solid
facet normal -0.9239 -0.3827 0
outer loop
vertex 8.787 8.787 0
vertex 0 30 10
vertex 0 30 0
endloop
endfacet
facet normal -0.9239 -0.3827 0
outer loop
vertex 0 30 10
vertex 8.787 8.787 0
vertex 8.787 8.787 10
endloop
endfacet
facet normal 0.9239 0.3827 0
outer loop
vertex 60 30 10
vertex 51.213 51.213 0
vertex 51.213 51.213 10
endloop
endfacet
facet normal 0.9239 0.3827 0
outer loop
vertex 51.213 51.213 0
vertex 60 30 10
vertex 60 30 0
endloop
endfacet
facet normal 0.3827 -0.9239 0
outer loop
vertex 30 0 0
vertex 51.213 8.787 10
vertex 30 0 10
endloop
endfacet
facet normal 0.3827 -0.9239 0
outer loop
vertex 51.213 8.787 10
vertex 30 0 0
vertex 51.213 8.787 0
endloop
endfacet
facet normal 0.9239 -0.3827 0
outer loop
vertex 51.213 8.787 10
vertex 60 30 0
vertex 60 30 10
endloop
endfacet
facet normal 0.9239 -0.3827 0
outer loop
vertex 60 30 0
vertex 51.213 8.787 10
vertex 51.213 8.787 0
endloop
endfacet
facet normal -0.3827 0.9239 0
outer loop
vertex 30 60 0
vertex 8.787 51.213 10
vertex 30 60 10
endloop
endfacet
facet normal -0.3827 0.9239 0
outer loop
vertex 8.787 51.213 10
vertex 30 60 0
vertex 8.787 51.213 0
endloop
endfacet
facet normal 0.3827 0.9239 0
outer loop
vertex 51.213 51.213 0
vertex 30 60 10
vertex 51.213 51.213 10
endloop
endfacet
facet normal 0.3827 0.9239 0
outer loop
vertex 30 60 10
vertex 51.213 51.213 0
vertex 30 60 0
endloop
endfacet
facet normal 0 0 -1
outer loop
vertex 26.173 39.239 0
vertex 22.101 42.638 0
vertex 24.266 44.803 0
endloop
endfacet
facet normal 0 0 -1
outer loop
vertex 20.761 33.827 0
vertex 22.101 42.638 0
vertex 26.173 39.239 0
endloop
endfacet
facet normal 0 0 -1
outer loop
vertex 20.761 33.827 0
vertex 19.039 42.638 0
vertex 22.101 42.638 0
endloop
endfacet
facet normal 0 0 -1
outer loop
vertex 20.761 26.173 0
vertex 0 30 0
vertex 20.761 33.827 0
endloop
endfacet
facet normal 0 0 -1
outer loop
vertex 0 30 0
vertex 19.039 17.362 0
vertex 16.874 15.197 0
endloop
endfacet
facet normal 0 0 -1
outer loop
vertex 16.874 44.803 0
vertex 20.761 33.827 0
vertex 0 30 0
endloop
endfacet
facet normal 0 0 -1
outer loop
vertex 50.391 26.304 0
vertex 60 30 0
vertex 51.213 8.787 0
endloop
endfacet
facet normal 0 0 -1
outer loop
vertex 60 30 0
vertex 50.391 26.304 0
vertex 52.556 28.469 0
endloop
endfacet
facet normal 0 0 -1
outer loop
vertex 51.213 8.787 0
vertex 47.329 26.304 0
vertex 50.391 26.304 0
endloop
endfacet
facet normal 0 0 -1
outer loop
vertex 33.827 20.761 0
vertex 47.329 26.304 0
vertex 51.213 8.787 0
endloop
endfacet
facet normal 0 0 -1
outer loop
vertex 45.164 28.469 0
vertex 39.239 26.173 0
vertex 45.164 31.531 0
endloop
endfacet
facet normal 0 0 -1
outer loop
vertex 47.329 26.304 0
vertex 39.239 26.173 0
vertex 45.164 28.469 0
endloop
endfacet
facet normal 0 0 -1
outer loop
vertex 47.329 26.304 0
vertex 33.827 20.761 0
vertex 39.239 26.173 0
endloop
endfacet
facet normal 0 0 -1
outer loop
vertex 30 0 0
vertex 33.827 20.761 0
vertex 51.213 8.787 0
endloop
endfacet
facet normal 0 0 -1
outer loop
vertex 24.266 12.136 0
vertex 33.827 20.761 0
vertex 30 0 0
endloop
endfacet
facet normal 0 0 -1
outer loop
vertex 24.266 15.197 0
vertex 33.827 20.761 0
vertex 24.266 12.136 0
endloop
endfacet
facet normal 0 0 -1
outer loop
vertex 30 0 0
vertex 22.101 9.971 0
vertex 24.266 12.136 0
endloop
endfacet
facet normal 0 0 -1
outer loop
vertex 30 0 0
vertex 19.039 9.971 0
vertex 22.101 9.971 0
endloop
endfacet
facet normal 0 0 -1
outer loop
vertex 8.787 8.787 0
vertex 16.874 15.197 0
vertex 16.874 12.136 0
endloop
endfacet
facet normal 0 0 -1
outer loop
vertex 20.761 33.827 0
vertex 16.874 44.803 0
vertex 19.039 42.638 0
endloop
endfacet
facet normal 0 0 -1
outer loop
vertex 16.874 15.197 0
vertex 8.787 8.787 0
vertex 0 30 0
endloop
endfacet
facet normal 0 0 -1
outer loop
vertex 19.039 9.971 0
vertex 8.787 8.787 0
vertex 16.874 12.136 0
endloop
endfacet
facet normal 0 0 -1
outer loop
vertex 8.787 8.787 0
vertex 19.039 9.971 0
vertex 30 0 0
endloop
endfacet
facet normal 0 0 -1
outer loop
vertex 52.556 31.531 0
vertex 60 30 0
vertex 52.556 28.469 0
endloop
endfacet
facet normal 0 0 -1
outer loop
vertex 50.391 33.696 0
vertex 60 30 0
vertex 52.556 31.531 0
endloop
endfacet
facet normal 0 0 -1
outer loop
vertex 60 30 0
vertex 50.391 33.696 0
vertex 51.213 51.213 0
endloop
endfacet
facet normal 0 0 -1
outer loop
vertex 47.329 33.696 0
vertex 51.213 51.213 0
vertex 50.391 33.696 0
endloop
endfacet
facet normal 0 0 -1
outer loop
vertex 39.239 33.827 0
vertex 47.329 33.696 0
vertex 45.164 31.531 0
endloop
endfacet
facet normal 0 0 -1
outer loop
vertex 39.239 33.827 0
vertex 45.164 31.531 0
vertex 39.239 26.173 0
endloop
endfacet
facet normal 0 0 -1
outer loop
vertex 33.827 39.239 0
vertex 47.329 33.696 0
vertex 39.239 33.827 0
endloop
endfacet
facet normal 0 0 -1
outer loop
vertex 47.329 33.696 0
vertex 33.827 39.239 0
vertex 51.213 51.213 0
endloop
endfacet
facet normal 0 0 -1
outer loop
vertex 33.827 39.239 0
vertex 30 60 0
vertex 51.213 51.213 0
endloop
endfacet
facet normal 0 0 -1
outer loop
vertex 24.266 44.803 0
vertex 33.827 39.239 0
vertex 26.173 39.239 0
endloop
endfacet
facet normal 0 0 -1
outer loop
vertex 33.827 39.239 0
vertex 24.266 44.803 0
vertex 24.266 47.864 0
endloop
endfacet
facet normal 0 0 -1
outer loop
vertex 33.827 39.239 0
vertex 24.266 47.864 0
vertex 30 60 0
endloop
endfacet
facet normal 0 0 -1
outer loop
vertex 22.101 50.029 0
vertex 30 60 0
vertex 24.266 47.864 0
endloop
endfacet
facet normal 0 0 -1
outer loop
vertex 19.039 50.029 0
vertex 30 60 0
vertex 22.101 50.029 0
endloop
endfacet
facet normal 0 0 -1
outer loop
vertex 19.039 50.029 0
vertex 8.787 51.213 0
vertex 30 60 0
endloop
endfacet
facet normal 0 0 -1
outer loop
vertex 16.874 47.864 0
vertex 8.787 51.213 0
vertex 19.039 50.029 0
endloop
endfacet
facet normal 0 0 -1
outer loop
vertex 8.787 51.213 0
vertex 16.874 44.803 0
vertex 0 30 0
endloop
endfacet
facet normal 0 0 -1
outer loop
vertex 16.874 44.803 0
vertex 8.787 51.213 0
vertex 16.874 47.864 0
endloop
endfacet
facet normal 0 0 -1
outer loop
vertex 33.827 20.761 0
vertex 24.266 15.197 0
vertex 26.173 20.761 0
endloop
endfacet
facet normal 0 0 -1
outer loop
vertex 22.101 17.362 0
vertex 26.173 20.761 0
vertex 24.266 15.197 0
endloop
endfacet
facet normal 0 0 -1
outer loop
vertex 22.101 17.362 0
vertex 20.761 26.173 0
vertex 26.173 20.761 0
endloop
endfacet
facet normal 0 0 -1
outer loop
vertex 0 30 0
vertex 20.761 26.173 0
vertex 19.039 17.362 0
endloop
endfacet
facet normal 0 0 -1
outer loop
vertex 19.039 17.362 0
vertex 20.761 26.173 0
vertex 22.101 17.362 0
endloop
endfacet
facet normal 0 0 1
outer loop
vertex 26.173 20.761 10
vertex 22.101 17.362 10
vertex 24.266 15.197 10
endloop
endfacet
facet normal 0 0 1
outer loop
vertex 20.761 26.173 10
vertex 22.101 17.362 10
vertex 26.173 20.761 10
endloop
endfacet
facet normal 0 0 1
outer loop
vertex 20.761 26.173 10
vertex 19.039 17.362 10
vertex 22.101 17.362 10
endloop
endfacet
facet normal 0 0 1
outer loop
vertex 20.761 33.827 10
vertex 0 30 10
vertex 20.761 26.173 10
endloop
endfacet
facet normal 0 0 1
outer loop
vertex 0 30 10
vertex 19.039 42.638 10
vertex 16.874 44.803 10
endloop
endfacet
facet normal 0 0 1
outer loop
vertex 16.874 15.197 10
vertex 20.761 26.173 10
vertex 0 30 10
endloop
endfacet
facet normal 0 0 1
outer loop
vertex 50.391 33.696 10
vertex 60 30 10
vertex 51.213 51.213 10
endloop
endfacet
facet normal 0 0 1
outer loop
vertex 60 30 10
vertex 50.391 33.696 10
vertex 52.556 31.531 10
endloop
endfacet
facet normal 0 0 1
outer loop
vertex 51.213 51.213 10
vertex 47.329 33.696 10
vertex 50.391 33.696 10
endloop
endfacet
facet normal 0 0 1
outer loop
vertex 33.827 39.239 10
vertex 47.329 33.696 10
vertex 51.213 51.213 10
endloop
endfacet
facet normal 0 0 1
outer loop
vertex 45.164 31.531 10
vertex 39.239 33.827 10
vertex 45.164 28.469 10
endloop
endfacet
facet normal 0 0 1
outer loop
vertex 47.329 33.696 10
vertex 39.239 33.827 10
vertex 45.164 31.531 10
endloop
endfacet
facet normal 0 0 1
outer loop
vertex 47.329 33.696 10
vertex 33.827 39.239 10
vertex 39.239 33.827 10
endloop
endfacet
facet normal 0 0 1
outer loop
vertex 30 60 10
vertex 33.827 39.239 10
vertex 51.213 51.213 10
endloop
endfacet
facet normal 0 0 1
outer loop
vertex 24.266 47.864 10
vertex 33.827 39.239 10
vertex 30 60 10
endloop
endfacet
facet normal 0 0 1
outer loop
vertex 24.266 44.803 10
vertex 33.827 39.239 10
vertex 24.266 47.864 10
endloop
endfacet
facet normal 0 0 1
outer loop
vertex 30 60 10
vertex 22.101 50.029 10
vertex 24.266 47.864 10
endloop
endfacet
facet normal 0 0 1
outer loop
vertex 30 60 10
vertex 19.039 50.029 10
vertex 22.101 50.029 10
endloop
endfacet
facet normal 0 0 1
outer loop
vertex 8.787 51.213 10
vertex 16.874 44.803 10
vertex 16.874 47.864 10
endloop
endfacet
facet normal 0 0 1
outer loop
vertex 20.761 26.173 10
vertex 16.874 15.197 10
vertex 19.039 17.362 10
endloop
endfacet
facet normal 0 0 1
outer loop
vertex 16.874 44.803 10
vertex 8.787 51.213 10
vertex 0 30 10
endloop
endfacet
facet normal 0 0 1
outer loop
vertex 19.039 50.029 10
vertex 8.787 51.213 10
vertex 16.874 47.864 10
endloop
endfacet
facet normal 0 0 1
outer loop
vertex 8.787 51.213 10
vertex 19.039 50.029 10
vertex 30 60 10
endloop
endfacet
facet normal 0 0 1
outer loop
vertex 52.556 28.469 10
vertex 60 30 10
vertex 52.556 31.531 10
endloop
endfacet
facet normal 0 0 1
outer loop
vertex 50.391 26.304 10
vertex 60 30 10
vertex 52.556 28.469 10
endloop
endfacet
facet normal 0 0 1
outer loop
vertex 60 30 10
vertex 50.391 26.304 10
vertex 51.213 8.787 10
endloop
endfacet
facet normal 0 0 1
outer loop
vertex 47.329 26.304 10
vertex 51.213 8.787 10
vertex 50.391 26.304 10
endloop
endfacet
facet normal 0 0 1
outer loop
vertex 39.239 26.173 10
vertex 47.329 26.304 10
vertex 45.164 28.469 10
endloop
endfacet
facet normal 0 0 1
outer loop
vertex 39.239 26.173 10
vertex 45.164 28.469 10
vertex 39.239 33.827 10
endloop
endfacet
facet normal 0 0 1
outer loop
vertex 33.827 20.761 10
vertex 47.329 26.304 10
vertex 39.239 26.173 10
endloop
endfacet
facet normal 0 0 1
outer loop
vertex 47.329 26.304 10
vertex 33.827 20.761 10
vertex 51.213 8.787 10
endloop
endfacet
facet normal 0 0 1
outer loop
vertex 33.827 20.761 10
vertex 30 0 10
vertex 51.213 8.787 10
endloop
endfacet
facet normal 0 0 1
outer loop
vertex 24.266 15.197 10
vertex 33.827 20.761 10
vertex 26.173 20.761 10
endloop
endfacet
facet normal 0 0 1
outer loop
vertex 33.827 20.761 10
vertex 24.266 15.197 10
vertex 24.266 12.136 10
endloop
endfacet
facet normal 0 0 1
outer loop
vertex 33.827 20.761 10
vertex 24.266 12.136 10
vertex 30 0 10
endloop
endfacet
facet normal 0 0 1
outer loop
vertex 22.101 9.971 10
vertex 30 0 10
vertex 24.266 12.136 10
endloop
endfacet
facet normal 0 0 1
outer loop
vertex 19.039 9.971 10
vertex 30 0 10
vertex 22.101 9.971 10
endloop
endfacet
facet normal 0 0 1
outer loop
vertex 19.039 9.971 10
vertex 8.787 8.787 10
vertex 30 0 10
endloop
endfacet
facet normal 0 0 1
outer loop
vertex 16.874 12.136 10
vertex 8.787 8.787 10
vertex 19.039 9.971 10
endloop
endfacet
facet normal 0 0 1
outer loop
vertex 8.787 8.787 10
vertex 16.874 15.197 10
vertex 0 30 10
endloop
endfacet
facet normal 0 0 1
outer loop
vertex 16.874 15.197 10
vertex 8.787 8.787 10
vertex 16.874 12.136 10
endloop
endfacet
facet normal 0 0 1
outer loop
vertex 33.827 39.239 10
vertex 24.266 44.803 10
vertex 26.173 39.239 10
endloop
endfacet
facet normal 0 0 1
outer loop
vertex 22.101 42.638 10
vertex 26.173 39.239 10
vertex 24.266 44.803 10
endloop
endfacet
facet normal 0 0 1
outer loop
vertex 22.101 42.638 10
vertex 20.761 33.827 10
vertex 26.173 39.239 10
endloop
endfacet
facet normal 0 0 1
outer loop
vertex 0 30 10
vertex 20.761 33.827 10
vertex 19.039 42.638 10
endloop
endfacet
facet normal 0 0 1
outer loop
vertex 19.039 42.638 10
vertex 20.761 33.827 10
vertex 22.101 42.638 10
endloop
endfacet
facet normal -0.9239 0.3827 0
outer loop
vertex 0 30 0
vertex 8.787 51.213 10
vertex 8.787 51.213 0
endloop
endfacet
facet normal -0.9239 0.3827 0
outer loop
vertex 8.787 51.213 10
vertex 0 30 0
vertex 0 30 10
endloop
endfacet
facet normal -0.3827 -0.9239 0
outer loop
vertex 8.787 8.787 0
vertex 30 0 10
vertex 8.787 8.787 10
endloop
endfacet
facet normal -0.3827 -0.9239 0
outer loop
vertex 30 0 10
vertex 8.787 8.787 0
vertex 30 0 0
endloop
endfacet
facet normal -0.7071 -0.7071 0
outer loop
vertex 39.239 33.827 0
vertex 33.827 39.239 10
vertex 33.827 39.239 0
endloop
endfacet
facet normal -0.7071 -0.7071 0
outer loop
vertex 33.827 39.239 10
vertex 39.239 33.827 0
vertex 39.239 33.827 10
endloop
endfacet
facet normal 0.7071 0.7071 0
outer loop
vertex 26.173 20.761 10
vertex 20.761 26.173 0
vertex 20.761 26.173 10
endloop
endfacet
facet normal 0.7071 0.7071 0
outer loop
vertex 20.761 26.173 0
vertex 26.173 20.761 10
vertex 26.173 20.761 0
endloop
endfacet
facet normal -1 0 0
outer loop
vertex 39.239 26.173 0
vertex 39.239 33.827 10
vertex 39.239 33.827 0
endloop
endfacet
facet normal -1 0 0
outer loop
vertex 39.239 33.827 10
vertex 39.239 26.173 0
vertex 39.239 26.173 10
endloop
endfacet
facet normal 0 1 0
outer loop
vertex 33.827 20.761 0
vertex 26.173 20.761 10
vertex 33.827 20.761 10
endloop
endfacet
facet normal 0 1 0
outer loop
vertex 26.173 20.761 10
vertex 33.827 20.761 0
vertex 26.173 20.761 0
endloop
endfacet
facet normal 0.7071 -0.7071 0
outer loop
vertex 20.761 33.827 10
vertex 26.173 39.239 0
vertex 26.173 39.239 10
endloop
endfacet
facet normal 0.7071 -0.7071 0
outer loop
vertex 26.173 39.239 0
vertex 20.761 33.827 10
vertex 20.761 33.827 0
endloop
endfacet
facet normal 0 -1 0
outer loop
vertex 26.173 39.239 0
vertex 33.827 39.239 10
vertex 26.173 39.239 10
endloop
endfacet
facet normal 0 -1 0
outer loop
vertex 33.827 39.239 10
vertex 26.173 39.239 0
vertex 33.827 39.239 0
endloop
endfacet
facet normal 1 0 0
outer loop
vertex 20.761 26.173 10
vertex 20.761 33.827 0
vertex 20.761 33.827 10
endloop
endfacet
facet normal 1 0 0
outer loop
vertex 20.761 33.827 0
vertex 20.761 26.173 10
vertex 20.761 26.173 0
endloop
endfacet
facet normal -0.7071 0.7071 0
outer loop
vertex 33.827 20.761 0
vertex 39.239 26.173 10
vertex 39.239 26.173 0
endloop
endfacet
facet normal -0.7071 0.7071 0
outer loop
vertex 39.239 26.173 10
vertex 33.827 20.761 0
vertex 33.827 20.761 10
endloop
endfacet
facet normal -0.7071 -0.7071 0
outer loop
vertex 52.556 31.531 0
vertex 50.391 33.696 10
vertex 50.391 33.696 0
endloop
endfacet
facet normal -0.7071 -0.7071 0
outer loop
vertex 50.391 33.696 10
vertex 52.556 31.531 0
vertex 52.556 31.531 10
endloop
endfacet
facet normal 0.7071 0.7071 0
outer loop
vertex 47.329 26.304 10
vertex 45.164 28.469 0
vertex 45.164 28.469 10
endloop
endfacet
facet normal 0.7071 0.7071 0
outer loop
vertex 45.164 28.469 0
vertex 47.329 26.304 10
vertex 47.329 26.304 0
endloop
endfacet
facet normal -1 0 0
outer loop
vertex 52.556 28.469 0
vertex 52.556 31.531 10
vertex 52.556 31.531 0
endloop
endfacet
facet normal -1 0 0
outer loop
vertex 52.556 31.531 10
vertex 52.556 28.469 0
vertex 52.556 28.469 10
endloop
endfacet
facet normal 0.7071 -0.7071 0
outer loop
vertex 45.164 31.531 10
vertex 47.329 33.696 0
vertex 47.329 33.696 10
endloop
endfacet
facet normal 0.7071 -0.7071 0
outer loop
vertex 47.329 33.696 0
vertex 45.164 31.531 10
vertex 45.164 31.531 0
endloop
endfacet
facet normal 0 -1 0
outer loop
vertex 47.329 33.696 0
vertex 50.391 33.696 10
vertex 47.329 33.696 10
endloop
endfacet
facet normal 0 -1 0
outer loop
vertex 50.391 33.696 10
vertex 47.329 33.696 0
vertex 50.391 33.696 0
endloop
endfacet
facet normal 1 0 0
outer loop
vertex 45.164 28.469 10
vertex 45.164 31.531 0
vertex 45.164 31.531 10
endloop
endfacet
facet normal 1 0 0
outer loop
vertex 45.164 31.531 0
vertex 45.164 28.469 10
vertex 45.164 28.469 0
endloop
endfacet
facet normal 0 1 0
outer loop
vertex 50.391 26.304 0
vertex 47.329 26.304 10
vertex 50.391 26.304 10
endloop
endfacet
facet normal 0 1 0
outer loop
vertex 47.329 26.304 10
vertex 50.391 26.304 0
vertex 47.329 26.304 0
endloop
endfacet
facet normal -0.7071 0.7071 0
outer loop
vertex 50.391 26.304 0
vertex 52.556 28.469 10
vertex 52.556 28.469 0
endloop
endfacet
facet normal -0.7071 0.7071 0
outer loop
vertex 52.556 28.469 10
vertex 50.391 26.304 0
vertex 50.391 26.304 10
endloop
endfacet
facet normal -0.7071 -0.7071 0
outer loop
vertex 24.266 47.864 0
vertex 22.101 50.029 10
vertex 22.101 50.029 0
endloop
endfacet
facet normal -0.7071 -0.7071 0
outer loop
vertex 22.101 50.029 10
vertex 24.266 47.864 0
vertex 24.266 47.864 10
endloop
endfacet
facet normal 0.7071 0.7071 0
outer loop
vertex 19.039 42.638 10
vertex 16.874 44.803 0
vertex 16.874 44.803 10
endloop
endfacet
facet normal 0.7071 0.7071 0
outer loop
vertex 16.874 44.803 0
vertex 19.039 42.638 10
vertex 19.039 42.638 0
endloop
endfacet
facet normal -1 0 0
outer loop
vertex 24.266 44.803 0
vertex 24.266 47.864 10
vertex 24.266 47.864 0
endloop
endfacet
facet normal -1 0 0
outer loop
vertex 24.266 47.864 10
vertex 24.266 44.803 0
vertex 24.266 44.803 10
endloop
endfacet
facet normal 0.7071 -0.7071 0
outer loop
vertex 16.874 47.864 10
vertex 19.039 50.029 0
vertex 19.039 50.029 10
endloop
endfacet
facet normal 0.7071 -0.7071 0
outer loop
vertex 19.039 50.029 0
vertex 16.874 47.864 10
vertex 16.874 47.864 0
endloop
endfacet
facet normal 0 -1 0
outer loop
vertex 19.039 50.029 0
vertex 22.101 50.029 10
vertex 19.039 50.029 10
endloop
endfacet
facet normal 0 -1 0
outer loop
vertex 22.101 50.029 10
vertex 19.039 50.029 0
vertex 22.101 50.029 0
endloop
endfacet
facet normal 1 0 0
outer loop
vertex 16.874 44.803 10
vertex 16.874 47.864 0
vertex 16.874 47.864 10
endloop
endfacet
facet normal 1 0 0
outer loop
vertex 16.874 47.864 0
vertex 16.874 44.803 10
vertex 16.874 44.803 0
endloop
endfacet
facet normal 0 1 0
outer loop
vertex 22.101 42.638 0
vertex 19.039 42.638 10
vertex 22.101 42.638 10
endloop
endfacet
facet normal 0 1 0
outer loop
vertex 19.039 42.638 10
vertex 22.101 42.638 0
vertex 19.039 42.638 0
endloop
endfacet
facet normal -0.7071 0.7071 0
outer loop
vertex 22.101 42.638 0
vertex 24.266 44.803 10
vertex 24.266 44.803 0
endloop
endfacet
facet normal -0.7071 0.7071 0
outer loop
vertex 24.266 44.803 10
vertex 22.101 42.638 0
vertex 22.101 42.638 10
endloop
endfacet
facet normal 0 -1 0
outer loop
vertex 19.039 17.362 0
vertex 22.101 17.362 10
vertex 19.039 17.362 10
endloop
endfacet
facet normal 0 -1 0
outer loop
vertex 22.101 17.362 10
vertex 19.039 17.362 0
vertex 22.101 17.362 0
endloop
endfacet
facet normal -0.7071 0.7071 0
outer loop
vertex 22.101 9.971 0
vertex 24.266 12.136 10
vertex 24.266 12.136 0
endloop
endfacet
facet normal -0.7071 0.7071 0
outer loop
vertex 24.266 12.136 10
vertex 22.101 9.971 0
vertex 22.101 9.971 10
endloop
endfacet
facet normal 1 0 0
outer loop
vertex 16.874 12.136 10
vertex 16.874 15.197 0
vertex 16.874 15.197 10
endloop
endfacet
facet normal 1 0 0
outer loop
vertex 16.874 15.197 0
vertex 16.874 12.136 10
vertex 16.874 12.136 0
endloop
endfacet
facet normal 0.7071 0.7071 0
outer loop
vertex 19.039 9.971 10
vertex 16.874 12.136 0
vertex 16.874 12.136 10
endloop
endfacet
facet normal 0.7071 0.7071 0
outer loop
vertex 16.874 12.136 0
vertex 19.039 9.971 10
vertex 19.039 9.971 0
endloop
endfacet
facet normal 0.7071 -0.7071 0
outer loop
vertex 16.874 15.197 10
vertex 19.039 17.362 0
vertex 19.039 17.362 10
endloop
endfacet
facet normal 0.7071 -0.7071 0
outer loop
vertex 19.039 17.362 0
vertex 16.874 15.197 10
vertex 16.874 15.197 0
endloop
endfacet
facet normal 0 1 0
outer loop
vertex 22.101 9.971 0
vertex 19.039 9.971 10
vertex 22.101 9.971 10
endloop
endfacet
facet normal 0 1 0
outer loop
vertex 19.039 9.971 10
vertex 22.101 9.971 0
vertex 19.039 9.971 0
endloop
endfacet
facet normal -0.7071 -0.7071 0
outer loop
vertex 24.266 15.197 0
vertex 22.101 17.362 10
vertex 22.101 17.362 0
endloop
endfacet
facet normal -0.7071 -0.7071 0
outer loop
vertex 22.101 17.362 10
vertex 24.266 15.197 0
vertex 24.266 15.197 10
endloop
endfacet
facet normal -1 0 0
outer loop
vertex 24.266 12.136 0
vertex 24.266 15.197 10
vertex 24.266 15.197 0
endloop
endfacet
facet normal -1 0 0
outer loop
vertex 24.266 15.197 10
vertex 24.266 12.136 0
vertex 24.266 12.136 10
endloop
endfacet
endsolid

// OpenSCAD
$fn = 32;

// ----------------------------------------------------------------------
// Polygon plate: 8-gon R30, 3 bolt windows
// ----------------------------------------------------------------------

// --- parameters (mm) ---
sides = 8;                // number of polygon sides
plate_r = 30;             // circumscribed radius of the polygon
bore_r = 10;              // centre bore radius
bolts = 3;                // number of bolt windows
ring_r = 18.86;           // bolt-circle radius
bolt_r = 4;               // bolt window radius
plate_t = 10;             // plate thickness, Z (extrusion height)
fit_tol = 0.1;            // declared fit tolerance (prompt contract)
free_tol = 0.3;           // declared free tolerance (prompt contract)

plate_d = 2 * plate_r;  // circumscribed diameter
bore_d = 2 * bore_r;  // centre bore diameter
bolt_d = 2 * bolt_r;  // bolt window diameter
ring_d = 2 * ring_r;  // bolt-circle diameter

profile = [[60, 30], [51.213, 51.213], [30, 60], [8.787, 51.213], [0, 30], [8.787, 8.787], [30, 0], [51.213, 8.787]];  // primary outline, 8 points, counter clockwise
void_1 = [[39.239, 33.827], [33.827, 39.239], [26.173, 39.239], [20.761, 33.827], [20.761, 26.173], [26.173, 20.761], [33.827, 20.761], [39.239, 26.173]];  // centre bore, 8 points
void_2 = [[52.556, 31.531], [50.391, 33.696], [47.329, 33.696], [45.164, 31.531], [45.164, 28.469], [47.329, 26.304], [50.391, 26.304], [52.556, 28.469]];  // bolt window 1, 8 points
void_3 = [[24.266, 47.864], [22.101, 50.029], [19.039, 50.029], [16.874, 47.864], [16.874, 44.803], [19.039, 42.638], [22.101, 42.638], [24.266, 44.803]];  // bolt window 2, 8 points
void_4 = [[24.266, 15.197], [22.101, 17.362], [19.039, 17.362], [16.874, 15.197], [16.874, 12.136], [19.039, 9.971], [22.101, 9.971], [24.266, 12.136]];  // bolt window 3, 8 points

// --- the one profile operation ---
difference() {
  linear_extrude(height = plate_t) polygon(points = profile);
  translate([0, 0, -1])
    linear_extrude(height = plate_t + 2) polygon(points = void_1);
  translate([0, 0, -1])
    linear_extrude(height = plate_t + 2) polygon(points = void_2);
  translate([0, 0, -1])
    linear_extrude(height = plate_t + 2) polygon(points = void_3);
  translate([0, 0, -1])
    linear_extrude(height = plate_t + 2) polygon(points = void_4);
}
